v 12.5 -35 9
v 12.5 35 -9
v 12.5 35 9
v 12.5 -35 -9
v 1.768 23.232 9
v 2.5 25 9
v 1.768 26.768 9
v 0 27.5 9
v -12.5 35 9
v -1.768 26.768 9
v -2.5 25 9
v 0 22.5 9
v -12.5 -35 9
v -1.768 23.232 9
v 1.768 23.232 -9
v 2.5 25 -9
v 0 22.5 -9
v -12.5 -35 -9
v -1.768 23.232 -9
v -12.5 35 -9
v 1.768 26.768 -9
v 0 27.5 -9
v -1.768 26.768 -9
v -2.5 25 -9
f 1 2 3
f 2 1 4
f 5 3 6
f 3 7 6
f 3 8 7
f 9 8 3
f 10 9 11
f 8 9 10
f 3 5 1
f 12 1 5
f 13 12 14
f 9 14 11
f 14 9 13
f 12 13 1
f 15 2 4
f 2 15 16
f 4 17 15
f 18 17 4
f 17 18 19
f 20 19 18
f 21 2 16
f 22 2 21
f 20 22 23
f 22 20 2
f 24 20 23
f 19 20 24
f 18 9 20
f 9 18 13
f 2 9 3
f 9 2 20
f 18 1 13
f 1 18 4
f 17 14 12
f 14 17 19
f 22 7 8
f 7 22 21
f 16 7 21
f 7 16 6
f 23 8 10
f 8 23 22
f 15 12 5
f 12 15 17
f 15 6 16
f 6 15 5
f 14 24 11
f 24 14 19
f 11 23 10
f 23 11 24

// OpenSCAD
// spacer for the shelf

x = 25;
y = 70;
z = 18;

h_d = 5;
h_offset = 10;

offset = 0.5*y-h_offset;
difference() {
  cube([x, y, z], center=true);
  translate([0, offset, 0]) cylinder(d=h_d, h=z, center=true);
}
